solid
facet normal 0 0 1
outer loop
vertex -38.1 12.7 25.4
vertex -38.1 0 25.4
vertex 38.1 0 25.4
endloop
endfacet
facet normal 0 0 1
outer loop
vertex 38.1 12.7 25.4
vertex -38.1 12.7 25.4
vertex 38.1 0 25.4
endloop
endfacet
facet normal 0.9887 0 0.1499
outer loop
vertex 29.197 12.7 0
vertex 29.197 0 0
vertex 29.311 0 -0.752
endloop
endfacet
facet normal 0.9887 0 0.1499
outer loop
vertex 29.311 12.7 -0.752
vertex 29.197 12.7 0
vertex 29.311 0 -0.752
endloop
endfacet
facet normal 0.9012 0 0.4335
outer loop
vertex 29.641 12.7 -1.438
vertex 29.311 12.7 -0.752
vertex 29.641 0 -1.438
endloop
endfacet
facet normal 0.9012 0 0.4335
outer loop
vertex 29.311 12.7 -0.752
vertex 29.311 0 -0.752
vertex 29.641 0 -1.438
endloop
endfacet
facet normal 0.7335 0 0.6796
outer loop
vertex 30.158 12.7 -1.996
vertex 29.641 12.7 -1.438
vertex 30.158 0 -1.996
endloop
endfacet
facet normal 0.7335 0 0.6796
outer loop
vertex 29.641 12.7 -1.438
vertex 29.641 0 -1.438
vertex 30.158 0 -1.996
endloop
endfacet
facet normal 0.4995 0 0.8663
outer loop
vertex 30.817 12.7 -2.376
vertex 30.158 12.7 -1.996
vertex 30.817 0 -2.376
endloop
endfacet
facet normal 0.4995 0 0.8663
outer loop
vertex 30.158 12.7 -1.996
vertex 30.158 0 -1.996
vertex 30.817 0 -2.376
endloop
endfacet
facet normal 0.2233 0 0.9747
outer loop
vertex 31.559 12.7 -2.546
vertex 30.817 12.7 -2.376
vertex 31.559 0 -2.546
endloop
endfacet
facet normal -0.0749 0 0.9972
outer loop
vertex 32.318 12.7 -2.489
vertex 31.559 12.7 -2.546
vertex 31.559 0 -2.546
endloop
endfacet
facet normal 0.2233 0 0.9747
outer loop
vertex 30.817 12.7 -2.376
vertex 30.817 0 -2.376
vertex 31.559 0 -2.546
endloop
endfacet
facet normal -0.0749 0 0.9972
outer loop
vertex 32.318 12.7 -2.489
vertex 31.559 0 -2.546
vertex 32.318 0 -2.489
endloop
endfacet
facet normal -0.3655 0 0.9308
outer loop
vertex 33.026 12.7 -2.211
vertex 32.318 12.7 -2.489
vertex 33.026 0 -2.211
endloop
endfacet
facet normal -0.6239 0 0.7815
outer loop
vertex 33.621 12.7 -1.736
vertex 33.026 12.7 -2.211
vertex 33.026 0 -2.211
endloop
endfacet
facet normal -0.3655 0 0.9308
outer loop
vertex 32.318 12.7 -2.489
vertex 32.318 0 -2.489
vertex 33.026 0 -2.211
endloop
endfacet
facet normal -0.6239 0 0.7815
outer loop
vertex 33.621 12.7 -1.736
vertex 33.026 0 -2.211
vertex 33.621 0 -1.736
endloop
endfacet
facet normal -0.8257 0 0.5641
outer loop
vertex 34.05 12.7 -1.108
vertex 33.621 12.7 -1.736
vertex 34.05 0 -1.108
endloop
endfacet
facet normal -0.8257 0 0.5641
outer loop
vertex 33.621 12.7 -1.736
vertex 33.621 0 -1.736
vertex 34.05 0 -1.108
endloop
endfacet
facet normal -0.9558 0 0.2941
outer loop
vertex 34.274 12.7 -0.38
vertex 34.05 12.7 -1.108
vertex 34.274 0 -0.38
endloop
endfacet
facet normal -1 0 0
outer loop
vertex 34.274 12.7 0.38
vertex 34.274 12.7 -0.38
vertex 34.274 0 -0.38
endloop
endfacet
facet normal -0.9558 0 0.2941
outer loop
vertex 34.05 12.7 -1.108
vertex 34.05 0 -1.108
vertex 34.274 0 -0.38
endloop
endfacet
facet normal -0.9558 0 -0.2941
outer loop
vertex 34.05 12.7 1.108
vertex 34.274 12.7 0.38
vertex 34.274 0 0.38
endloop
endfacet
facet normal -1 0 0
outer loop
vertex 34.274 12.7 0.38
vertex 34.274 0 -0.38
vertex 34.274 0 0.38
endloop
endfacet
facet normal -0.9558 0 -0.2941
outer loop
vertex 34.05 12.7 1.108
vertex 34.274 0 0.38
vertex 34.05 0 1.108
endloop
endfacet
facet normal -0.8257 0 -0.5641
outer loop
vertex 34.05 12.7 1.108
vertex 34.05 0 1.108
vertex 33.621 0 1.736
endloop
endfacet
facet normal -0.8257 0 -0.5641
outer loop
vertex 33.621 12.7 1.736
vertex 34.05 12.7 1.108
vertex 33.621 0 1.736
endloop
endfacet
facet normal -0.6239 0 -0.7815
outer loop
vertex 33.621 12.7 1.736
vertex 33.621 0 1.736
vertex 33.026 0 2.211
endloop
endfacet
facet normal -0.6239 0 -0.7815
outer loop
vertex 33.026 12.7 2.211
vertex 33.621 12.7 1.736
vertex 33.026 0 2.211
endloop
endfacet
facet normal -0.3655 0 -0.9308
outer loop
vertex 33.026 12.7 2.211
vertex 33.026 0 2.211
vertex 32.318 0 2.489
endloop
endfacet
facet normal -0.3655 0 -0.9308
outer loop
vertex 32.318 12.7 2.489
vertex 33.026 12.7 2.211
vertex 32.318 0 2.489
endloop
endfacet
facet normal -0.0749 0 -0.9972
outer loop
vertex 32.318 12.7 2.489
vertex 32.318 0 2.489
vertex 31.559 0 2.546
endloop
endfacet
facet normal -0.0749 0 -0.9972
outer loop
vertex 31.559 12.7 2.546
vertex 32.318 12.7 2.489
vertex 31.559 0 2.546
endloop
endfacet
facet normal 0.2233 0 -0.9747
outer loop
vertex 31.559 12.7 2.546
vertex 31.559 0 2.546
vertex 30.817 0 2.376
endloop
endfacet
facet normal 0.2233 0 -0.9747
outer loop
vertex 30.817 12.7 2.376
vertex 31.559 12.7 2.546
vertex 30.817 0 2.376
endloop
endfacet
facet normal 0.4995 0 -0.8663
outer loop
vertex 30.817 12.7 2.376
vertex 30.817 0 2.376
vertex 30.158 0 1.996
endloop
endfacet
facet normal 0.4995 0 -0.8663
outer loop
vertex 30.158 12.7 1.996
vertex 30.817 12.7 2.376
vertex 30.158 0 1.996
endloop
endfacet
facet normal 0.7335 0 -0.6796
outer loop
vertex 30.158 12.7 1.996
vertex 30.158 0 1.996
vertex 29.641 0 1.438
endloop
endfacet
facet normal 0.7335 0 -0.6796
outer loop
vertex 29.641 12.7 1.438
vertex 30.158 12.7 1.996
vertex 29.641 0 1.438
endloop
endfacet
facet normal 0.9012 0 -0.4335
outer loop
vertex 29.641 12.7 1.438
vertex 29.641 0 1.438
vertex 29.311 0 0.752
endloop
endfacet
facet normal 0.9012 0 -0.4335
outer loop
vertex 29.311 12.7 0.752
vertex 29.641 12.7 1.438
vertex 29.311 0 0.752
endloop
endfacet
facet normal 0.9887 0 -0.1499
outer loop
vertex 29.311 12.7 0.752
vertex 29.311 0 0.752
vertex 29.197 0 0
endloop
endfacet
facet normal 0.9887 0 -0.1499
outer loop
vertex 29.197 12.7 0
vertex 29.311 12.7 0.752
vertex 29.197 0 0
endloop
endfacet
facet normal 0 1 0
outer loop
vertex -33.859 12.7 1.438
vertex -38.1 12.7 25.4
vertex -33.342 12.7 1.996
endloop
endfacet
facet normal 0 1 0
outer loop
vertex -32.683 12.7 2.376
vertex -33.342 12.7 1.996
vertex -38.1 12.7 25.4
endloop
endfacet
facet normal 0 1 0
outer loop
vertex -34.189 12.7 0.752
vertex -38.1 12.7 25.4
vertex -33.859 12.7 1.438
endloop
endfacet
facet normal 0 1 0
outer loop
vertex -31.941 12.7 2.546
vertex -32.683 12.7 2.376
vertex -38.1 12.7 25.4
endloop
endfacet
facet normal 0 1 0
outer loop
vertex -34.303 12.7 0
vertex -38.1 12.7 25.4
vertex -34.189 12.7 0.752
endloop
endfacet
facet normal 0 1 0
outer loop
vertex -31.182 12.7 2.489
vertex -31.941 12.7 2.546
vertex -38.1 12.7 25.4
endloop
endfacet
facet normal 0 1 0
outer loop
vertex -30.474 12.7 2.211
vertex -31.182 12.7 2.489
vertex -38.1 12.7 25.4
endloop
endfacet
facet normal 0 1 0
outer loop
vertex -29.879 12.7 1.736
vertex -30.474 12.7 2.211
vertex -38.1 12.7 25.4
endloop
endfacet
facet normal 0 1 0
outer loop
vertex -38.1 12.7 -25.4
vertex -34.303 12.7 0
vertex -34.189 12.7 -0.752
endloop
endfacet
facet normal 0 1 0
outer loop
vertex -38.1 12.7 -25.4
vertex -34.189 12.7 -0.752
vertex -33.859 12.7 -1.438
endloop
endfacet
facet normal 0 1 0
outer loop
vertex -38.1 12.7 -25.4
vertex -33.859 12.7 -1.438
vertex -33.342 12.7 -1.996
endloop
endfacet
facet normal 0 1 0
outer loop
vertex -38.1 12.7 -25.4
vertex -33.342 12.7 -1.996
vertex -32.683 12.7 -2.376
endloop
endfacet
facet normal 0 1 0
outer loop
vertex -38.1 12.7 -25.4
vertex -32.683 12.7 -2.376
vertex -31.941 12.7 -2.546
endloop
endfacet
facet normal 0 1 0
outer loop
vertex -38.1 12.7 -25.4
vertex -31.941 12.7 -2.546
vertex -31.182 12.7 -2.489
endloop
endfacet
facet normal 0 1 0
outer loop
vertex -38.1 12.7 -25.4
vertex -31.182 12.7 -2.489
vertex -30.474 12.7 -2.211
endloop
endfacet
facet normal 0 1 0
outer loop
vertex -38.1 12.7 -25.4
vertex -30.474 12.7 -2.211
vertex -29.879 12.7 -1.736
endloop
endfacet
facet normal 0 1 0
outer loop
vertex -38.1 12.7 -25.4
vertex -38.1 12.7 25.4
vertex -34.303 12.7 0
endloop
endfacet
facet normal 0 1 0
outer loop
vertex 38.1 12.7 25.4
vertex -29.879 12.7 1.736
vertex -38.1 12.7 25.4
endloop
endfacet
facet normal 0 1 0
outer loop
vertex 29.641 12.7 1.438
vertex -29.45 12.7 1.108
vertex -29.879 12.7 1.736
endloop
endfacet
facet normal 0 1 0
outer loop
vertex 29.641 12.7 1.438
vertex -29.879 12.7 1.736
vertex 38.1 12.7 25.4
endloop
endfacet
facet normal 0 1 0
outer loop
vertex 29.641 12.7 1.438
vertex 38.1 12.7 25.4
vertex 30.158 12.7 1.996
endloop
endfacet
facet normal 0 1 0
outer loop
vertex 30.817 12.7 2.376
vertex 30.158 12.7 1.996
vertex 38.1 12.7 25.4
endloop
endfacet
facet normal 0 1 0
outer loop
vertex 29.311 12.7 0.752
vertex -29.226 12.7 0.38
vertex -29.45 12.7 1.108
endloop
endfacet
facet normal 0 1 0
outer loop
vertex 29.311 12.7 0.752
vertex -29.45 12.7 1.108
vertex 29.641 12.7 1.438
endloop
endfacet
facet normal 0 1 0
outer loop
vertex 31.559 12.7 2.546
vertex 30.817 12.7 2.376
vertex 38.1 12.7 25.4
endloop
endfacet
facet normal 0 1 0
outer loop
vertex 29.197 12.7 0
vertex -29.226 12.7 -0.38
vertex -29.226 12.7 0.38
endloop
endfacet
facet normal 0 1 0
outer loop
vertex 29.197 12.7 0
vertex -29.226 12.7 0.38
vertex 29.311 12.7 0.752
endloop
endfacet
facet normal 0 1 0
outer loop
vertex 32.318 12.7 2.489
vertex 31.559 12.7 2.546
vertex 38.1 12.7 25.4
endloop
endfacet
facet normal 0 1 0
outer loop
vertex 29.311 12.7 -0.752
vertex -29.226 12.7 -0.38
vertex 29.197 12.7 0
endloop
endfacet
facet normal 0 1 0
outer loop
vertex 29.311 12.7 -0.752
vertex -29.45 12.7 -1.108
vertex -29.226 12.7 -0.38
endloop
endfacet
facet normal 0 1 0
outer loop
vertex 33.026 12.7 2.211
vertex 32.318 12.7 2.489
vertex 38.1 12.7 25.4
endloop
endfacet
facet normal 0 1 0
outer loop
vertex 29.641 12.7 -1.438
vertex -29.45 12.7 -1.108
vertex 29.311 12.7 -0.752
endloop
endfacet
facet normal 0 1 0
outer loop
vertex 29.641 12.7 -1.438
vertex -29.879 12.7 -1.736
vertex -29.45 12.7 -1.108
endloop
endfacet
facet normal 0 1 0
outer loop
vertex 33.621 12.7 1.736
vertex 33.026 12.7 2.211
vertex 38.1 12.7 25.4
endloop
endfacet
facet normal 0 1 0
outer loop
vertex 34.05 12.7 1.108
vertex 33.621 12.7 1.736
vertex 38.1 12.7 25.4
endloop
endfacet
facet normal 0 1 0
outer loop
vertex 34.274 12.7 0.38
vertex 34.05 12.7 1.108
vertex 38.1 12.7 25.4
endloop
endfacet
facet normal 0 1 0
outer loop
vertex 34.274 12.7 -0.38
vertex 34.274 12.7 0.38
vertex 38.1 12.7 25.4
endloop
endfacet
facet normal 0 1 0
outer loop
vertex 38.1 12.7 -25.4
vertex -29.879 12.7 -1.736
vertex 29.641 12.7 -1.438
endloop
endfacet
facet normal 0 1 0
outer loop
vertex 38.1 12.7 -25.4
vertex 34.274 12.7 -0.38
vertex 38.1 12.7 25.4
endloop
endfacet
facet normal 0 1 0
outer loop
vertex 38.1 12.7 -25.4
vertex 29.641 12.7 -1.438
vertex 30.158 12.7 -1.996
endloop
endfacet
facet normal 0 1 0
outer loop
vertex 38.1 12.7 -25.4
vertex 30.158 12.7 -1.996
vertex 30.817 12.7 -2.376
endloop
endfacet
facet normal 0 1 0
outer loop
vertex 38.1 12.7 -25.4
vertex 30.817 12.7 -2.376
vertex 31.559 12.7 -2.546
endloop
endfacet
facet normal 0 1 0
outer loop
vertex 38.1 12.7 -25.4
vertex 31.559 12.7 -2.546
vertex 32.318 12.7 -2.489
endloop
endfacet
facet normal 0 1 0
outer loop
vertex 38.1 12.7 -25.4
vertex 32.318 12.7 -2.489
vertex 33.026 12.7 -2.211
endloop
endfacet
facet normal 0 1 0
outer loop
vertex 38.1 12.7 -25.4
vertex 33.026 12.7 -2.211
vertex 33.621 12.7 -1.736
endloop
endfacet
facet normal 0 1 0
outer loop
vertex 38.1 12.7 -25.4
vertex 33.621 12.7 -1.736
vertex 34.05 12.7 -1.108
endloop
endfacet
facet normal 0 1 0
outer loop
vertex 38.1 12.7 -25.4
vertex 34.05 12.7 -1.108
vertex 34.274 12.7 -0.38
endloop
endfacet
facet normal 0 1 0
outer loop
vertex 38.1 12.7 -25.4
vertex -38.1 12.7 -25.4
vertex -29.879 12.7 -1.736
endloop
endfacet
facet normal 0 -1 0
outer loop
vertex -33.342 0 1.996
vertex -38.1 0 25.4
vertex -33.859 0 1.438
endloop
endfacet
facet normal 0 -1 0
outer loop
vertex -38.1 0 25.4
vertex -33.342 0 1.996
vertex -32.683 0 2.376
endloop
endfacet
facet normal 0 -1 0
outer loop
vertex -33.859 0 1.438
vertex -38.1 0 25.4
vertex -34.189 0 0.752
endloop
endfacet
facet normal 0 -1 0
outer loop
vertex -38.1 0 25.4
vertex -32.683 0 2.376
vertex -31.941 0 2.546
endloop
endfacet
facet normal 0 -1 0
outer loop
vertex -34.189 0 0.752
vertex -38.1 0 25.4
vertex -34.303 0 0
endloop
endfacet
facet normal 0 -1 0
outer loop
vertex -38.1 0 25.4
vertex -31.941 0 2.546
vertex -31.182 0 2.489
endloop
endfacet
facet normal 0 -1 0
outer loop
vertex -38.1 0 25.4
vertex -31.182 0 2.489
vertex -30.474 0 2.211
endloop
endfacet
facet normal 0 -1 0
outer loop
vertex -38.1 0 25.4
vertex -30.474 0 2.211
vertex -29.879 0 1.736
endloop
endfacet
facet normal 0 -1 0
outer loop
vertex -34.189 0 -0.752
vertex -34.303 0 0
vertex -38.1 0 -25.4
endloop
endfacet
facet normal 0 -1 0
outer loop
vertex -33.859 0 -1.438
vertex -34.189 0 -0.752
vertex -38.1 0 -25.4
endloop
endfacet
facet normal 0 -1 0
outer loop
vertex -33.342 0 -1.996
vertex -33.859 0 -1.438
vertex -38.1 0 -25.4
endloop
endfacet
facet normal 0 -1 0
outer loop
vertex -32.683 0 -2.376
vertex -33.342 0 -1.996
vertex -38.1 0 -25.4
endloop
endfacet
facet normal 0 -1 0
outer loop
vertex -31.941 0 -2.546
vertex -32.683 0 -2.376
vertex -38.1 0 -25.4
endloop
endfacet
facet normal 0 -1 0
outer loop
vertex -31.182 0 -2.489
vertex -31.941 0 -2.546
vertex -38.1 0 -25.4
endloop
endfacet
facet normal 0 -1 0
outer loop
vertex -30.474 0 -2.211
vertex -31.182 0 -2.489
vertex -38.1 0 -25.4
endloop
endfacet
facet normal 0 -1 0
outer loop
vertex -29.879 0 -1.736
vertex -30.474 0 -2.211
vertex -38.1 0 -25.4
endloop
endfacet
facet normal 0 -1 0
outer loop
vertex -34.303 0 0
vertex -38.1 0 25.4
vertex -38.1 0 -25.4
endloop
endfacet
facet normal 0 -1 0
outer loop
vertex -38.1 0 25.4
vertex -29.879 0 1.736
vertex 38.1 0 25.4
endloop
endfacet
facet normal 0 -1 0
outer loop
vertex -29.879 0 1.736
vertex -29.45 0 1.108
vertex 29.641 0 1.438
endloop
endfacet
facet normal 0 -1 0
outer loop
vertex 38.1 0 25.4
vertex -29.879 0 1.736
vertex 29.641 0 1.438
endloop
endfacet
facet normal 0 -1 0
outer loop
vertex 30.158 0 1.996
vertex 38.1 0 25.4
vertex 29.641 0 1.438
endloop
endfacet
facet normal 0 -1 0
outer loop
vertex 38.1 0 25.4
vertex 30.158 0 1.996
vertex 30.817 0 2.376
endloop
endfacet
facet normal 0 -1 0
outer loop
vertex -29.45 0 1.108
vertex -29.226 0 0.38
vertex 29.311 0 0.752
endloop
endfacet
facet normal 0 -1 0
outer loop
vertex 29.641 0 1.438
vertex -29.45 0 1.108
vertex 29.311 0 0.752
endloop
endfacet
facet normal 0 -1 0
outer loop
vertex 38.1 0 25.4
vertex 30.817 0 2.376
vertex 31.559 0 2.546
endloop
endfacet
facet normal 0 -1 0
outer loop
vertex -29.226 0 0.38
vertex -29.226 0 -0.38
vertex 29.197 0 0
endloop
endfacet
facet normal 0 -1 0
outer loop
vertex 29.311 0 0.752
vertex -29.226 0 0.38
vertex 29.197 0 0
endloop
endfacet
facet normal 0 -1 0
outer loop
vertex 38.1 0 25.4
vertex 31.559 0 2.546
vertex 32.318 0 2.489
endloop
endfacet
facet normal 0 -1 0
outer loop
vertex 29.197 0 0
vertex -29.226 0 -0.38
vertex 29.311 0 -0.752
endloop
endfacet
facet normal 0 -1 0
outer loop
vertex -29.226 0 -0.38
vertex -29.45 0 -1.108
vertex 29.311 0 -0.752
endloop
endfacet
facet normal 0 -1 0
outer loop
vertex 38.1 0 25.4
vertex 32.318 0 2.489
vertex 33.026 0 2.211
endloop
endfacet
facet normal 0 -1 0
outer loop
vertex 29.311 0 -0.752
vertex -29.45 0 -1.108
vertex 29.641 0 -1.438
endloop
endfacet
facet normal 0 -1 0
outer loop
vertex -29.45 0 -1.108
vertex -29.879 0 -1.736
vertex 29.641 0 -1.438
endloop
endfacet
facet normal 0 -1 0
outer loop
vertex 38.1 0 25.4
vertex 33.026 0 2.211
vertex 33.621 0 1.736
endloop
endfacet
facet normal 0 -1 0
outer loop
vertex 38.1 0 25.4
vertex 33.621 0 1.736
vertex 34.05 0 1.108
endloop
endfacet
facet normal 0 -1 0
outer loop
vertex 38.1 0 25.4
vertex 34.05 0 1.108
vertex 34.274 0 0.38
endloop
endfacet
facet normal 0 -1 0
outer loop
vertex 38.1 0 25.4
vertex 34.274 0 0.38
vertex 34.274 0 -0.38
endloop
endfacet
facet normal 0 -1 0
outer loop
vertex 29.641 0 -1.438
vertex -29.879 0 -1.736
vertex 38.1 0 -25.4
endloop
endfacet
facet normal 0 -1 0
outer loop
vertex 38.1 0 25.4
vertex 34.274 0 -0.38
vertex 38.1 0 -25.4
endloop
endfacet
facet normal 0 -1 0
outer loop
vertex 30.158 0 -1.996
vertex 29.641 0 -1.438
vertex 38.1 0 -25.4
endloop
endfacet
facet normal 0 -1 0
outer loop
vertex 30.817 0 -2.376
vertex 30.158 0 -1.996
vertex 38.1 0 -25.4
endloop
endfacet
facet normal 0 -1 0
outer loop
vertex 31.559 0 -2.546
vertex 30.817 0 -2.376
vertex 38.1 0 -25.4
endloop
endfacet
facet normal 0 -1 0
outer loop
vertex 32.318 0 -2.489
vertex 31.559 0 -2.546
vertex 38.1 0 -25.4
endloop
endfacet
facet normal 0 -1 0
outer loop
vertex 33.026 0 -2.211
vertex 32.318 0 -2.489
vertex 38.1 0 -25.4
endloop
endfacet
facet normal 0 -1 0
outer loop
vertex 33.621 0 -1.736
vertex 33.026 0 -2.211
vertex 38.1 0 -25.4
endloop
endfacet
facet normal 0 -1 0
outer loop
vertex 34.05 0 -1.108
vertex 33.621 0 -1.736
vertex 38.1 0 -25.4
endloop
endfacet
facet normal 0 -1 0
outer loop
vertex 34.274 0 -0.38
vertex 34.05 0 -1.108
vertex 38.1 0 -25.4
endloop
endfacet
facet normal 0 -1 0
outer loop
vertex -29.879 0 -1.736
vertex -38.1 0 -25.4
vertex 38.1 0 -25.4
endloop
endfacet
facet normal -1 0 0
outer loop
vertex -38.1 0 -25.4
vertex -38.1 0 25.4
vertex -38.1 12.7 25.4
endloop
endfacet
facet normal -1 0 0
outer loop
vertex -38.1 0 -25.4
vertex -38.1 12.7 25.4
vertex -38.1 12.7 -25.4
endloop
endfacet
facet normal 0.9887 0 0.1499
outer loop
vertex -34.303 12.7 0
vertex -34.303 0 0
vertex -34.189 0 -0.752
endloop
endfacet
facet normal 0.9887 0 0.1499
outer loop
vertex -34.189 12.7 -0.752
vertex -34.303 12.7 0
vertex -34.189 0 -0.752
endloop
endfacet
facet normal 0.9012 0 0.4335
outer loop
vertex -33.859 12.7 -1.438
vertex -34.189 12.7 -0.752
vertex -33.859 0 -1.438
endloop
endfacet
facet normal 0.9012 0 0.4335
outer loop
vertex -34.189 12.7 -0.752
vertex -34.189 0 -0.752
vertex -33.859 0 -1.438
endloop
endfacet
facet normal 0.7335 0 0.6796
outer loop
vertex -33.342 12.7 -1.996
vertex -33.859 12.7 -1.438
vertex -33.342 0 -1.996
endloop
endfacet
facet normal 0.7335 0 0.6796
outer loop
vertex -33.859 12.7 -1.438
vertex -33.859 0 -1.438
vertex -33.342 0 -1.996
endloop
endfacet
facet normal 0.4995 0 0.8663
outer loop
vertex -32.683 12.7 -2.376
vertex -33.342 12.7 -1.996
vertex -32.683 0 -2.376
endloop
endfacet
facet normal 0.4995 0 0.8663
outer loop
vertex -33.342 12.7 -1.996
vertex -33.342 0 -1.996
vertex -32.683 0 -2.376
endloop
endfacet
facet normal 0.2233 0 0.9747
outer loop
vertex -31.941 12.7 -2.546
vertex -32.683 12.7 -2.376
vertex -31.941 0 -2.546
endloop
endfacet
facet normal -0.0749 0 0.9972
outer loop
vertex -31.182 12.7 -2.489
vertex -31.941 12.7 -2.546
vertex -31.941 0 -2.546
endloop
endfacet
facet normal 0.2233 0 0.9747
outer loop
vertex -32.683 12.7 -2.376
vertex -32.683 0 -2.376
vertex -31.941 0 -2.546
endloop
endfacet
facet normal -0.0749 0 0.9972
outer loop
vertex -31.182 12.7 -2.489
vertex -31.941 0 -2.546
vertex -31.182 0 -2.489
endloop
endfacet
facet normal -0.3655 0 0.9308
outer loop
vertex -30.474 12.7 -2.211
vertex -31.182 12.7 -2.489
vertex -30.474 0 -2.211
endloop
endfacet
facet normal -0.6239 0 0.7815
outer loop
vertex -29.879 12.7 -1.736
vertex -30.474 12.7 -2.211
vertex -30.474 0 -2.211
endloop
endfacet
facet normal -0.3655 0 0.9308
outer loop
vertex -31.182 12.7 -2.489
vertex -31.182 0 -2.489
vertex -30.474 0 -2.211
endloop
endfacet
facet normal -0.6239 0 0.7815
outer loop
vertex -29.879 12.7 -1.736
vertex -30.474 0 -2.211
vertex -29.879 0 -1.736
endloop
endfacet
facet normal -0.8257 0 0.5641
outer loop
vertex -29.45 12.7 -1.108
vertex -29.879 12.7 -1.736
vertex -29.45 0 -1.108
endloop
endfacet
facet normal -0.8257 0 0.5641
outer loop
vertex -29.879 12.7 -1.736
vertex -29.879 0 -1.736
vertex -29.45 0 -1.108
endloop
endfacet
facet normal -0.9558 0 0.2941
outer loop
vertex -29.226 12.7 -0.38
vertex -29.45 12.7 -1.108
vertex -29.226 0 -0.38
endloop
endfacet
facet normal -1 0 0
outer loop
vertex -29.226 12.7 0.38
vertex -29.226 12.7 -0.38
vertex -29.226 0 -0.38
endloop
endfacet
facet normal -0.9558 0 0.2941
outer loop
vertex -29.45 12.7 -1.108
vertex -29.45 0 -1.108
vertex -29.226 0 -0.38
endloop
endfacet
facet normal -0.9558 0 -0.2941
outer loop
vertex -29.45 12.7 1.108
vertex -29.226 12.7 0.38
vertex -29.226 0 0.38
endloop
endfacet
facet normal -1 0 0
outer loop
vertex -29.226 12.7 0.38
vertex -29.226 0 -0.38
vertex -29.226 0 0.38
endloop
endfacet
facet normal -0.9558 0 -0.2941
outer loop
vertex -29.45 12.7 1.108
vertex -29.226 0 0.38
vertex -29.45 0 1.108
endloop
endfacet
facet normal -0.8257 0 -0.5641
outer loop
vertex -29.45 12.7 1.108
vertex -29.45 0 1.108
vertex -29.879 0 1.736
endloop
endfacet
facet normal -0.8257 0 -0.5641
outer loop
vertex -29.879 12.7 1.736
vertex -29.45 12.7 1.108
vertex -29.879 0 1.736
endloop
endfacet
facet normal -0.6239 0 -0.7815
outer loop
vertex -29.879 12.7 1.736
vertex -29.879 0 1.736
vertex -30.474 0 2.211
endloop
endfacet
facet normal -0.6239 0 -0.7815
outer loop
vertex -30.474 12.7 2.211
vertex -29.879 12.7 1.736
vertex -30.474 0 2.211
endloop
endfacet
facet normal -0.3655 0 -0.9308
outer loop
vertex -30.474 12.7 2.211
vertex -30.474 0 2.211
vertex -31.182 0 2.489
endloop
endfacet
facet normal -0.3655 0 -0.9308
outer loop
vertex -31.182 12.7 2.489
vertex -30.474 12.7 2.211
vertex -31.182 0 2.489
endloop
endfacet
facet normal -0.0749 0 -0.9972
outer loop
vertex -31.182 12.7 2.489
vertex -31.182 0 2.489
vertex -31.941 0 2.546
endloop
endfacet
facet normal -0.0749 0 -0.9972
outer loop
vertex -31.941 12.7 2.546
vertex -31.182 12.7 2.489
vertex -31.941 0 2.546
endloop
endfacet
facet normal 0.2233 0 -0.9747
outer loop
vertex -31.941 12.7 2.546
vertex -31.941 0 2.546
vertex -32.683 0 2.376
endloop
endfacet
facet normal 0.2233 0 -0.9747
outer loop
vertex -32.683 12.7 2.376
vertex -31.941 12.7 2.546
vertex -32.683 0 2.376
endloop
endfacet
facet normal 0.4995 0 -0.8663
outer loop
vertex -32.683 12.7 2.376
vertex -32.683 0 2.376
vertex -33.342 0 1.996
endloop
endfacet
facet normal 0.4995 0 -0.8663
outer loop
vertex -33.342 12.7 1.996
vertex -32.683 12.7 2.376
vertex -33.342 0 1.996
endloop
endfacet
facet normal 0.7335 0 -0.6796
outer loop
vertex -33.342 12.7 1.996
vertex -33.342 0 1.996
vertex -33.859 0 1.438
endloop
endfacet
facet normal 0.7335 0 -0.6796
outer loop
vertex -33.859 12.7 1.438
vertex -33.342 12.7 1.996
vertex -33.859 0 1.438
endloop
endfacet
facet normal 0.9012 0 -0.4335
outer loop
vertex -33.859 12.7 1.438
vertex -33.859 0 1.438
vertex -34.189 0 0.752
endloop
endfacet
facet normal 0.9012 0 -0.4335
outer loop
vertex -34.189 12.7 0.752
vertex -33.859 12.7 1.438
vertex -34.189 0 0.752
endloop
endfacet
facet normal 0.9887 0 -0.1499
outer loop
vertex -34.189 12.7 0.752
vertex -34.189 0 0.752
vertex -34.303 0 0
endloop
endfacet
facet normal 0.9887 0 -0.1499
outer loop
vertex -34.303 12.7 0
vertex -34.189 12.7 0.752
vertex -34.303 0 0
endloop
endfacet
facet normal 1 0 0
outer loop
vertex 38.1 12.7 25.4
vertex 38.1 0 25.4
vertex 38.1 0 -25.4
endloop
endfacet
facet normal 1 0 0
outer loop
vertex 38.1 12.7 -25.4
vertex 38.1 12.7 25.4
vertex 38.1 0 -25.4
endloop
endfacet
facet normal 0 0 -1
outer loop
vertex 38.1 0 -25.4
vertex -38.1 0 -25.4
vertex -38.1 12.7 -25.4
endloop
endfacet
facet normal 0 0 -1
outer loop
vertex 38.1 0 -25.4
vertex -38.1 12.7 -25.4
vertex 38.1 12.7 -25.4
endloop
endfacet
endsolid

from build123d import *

# Parameters (mm, degrees)
SKETCH1_W               = 76.2
SKETCH1_H               = 50.8
BOSS_EXTRUDE1_DEPTH     = 12.7
F_1_4_20_TAPPED_HOLE1_D = 5.1054


with BuildPart() as part:
    # Sketch1 → Boss-Extrude1 (new body)
    with BuildSketch(Plane(origin=(0, 0, 0), x_dir=(1, 0, 0), z_dir=(0, 1, 0))):
        Rectangle(SKETCH1_W, SKETCH1_H)
    extrude(amount=BOSS_EXTRUDE1_DEPTH)

    # 1/4-20 Tapped Hole1 (through all)
    with Locations(Plane(origin=(0, 12.7, 0), x_dir=(1, 0, 0), z_dir=(0, 1, 0))):
        with Locations((-31.75, 0), (31.75, 0)):
            Hole(F_1_4_20_TAPPED_HOLE1_D / 2)


solid = part.part
